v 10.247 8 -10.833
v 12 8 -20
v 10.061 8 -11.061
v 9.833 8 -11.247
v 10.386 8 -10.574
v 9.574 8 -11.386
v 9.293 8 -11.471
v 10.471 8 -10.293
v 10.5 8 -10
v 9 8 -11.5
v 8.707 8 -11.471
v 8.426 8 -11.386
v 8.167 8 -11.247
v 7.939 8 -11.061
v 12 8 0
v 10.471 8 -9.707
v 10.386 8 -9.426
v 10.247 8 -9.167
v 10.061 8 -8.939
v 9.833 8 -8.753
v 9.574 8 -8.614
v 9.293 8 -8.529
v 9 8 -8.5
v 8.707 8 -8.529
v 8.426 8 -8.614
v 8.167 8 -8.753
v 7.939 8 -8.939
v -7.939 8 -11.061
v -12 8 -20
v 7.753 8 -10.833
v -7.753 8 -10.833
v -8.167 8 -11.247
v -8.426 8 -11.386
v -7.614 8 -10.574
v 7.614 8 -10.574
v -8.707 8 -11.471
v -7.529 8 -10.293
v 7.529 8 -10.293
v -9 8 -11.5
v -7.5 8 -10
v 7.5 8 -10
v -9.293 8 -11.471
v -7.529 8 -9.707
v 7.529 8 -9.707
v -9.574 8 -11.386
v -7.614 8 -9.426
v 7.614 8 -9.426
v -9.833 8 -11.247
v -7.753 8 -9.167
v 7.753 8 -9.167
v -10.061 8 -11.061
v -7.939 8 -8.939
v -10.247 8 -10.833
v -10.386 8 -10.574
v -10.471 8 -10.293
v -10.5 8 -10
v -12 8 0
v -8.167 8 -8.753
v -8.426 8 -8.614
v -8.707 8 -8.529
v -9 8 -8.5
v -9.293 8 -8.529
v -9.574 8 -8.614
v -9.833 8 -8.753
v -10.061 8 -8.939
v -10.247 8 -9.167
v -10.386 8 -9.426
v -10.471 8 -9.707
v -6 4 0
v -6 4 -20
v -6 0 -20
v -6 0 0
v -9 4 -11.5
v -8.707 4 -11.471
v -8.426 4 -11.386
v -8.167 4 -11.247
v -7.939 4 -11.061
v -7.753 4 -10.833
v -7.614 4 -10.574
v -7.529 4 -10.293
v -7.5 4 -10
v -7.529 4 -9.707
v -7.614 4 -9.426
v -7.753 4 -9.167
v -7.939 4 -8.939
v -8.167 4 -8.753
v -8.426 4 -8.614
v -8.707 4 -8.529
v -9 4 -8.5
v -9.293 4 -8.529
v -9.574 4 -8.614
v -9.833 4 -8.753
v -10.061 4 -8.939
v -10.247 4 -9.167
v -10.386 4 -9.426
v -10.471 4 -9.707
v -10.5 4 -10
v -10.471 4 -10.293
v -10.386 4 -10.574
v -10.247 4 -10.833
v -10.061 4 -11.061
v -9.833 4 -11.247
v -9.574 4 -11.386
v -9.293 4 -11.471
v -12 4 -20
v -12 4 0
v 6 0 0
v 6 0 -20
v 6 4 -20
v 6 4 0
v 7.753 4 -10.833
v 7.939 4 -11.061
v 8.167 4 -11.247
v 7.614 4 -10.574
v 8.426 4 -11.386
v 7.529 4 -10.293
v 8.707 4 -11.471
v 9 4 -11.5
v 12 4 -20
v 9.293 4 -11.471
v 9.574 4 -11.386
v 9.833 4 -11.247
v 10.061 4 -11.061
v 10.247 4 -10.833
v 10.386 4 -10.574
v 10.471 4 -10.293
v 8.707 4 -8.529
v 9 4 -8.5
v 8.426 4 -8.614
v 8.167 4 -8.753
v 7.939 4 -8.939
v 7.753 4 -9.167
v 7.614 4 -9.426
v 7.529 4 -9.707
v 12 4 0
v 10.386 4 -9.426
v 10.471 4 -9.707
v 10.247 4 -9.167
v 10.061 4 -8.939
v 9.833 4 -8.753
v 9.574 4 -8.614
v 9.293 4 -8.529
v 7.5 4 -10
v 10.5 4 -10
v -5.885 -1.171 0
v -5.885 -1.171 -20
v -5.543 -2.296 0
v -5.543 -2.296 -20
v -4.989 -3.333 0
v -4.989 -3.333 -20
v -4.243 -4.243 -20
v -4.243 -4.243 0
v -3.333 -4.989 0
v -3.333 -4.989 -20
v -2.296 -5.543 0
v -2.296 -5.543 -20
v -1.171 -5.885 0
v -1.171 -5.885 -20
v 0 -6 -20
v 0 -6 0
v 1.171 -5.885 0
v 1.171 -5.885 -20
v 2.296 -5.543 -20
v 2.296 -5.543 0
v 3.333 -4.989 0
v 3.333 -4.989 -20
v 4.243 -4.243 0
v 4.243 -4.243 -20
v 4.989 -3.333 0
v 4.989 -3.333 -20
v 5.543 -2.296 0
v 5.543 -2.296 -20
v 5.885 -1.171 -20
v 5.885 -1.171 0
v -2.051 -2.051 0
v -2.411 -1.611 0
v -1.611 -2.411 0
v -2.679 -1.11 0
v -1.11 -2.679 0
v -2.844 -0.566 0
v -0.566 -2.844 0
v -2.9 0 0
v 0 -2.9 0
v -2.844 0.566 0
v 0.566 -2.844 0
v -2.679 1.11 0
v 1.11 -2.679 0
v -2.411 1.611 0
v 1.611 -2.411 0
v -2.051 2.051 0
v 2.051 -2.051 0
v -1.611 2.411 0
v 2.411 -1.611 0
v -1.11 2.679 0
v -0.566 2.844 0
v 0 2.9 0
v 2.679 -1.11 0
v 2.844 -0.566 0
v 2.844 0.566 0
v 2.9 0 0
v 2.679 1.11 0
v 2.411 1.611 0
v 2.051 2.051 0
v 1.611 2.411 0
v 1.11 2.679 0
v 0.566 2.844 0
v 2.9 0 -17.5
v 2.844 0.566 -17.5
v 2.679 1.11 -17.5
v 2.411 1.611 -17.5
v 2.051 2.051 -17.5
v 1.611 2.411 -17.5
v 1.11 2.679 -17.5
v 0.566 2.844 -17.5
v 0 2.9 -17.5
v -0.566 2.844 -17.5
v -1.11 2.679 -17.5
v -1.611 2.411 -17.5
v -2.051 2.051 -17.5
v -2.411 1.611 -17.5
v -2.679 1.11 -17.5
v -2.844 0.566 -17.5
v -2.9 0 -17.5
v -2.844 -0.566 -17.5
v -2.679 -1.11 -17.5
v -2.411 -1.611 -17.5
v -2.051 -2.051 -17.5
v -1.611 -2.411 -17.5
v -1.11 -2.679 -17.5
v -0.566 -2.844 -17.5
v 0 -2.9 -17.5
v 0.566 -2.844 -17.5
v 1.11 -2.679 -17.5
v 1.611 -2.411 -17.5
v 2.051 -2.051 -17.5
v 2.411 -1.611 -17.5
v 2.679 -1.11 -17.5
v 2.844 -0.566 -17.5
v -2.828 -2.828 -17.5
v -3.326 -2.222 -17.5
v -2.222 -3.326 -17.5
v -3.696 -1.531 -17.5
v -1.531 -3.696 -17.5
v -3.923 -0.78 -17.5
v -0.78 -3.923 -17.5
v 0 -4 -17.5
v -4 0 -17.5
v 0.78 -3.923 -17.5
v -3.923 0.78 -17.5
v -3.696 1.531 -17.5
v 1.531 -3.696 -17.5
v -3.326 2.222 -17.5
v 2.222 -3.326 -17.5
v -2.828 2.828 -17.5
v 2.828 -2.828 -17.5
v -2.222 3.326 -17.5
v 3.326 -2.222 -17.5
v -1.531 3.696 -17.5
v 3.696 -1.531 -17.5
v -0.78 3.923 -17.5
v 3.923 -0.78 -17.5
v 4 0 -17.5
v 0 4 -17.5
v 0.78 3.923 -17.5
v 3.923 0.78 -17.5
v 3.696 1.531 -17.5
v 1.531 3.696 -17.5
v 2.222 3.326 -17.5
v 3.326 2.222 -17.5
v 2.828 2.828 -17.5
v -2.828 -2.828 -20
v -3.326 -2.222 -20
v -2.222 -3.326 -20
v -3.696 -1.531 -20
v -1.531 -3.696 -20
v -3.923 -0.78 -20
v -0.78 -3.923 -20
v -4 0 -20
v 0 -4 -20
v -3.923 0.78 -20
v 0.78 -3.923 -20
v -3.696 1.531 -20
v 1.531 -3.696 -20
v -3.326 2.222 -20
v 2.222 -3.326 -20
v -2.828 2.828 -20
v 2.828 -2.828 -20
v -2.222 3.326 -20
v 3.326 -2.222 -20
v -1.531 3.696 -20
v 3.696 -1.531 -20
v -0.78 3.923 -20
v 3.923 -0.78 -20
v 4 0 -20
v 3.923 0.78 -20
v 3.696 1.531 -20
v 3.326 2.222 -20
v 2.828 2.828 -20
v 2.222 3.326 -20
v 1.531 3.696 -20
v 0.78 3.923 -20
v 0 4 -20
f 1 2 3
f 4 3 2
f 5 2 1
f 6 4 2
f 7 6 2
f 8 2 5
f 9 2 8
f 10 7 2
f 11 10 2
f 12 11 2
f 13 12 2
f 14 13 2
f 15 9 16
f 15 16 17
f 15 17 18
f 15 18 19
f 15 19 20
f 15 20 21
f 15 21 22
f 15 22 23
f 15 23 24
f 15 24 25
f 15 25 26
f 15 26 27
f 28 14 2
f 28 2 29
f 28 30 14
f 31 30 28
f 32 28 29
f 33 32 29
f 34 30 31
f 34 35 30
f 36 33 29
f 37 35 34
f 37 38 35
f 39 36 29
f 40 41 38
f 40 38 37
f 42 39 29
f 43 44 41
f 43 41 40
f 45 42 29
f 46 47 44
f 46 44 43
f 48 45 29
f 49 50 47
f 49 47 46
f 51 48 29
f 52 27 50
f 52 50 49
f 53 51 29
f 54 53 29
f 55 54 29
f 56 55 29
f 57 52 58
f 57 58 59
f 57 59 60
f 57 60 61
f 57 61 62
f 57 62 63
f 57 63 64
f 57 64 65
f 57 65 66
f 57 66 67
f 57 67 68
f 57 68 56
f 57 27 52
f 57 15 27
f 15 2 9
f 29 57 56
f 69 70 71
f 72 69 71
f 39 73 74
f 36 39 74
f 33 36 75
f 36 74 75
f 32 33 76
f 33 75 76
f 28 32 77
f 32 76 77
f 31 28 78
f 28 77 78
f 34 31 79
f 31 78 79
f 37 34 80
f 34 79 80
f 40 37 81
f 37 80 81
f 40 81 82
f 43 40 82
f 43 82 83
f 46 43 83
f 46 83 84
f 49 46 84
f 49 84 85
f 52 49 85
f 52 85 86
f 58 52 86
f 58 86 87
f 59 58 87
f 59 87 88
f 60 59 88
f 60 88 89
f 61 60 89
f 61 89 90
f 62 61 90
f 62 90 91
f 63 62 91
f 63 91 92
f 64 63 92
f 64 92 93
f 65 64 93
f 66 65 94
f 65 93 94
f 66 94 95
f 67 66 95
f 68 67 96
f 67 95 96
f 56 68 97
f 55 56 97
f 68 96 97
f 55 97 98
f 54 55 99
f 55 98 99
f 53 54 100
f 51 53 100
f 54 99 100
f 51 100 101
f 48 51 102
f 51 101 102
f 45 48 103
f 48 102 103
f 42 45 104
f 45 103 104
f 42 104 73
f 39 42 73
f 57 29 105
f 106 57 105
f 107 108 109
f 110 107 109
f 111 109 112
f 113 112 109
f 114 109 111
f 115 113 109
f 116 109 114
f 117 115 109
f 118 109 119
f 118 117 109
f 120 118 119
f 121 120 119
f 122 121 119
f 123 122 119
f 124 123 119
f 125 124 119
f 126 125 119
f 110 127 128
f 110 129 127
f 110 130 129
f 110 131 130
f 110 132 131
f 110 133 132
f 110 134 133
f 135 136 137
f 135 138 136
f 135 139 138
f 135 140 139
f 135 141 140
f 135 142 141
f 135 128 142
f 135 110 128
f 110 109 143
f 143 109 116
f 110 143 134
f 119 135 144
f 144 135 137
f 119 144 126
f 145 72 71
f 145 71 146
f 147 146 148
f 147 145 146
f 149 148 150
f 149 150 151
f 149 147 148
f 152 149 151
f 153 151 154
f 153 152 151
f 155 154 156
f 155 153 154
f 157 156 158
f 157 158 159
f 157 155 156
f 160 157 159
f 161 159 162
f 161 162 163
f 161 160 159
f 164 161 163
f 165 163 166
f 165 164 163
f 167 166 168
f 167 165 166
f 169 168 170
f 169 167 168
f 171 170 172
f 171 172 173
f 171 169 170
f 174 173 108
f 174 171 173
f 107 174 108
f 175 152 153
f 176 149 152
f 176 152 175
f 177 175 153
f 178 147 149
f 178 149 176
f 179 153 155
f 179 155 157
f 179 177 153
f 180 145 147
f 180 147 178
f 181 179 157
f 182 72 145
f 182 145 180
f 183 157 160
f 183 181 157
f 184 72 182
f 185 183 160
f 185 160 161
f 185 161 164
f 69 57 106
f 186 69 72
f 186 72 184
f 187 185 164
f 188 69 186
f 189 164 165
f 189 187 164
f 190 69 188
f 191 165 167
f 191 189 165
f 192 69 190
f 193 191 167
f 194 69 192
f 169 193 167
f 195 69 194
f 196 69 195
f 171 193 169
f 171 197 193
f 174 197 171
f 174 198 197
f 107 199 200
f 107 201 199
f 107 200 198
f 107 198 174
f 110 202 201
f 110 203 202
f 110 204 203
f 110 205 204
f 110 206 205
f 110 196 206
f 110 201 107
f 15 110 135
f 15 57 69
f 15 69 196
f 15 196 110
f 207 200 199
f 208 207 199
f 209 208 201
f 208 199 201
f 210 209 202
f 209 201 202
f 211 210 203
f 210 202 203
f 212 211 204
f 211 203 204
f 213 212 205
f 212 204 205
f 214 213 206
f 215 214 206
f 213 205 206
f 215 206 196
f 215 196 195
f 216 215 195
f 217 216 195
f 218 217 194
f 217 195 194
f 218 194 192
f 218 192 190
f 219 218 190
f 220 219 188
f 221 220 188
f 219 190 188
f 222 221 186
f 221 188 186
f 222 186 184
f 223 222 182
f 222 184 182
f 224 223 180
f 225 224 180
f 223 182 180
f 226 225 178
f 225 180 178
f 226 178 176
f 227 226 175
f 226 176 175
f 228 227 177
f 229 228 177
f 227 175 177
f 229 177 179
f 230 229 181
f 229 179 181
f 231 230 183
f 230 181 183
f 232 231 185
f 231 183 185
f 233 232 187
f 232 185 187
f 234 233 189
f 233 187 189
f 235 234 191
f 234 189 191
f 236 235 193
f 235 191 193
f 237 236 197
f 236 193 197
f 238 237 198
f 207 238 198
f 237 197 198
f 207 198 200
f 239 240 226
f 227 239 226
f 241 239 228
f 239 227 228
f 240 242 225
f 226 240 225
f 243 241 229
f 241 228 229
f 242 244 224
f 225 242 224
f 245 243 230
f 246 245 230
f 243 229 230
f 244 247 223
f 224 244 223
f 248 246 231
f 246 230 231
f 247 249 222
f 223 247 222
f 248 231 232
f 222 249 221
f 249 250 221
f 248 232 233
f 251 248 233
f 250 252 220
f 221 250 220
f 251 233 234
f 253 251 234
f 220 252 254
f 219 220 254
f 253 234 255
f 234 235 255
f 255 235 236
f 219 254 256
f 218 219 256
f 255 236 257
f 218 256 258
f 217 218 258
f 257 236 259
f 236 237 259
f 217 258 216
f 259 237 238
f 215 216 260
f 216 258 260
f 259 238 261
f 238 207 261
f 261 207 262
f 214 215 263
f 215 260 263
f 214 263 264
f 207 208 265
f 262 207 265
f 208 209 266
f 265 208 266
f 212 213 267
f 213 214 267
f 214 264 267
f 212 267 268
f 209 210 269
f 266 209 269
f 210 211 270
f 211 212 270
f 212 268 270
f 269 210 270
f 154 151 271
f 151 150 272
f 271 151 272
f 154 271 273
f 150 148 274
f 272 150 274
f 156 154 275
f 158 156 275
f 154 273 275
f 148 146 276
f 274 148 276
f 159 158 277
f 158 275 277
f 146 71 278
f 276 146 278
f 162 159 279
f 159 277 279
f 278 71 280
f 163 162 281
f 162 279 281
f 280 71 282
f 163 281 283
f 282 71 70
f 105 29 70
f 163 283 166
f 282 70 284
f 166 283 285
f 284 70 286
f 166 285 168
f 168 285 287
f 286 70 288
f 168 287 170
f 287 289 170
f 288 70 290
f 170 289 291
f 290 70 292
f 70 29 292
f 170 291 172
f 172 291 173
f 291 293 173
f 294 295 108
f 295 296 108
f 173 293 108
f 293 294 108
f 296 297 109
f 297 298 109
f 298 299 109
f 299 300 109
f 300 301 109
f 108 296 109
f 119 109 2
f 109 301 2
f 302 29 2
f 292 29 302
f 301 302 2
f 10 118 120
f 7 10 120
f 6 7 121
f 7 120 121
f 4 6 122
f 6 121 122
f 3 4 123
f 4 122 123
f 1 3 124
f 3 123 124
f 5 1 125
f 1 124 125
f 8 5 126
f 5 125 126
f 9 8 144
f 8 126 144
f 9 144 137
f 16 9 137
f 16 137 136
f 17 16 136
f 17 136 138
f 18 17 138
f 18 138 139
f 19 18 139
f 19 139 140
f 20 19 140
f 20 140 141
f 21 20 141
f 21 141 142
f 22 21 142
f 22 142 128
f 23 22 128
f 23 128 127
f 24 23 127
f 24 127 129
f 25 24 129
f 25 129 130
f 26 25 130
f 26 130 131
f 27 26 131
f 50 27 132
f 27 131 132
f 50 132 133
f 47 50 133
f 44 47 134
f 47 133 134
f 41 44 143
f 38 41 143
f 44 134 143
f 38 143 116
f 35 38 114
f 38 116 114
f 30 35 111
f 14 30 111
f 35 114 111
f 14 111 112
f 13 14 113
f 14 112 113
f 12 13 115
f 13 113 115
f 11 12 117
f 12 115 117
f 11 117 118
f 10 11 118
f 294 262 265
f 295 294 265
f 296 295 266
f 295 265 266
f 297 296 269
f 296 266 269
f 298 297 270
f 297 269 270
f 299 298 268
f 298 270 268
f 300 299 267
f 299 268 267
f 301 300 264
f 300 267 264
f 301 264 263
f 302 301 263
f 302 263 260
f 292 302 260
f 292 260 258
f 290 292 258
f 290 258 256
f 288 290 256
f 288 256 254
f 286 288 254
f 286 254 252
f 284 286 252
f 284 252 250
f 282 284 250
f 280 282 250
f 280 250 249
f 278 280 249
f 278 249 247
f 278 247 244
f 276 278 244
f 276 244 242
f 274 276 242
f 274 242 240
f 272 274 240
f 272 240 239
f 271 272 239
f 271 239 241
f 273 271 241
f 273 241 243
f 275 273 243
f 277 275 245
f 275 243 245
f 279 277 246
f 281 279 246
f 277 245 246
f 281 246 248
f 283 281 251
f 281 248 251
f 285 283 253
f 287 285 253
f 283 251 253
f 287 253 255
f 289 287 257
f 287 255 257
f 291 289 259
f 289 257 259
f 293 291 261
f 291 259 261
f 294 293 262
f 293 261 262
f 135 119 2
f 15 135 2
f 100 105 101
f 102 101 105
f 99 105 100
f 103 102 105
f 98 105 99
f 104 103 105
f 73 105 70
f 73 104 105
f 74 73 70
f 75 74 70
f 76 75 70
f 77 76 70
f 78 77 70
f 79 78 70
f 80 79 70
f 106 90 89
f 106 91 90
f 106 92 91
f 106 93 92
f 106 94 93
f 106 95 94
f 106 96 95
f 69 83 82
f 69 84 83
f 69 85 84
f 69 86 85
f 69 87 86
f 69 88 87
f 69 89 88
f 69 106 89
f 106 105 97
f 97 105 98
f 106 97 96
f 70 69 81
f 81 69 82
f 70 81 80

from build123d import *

# Parameters (mm, degrees)
ESQUISSE1_R             = 4
BOSS_EXTRU_1_DEPTH      = 20
ESQUISSE2_R             = 4
ESQUISSE2_R_2           = 2.9
BOSS_EXTRU_2_DEPTH      = 17.5
ESQUISSE3_R             = 1.5
ENL_V_MAT_EXTRU_1_DEPTH = 17.5


with BuildPart() as part:
    # Esquisse1 → Boss.-Extru.1 (new body)
    with BuildSketch(Plane.XY):
        with BuildLine():
            Line((-12, 4), (-6, 4))
            Line((-6, 4), (-6, 0))
            ThreePointArc((-6, 0), (0, -6), (6, 0))
            Line((6, 0), (6, 4))
            Line((6, 4), (12, 4))
            Line((12, 4), (12, 8))
            Line((12, 8), (-12, 8))
            Line((-12, 8), (-12, 4))
        make_face()
        Circle(ESQUISSE1_R, mode=Mode.SUBTRACT)
    extrude(amount=-BOSS_EXTRU_1_DEPTH)

    # Esquisse2 → Boss.-Extru.2 (add)
    with BuildSketch(Plane.XY):
        Circle(ESQUISSE2_R)
        Circle(ESQUISSE2_R_2, mode=Mode.SUBTRACT)
    extrude(amount=-BOSS_EXTRU_2_DEPTH)

    # Esquisse3 → Enlèv. mat.-Extru.1 (cut)
    with BuildSketch(Plane.XZ.offset(-4)):
        with Locations(Location((9, -10, 0), (0, 0, 270))):
            Circle(ESQUISSE3_R)
        with Locations(Location((-9, -10, 0), (0, 0, 270))):
            Circle(ESQUISSE3_R)
    extrude(amount=-ENL_V_MAT_EXTRU_1_DEPTH, mode=Mode.SUBTRACT)


solid = part.part
